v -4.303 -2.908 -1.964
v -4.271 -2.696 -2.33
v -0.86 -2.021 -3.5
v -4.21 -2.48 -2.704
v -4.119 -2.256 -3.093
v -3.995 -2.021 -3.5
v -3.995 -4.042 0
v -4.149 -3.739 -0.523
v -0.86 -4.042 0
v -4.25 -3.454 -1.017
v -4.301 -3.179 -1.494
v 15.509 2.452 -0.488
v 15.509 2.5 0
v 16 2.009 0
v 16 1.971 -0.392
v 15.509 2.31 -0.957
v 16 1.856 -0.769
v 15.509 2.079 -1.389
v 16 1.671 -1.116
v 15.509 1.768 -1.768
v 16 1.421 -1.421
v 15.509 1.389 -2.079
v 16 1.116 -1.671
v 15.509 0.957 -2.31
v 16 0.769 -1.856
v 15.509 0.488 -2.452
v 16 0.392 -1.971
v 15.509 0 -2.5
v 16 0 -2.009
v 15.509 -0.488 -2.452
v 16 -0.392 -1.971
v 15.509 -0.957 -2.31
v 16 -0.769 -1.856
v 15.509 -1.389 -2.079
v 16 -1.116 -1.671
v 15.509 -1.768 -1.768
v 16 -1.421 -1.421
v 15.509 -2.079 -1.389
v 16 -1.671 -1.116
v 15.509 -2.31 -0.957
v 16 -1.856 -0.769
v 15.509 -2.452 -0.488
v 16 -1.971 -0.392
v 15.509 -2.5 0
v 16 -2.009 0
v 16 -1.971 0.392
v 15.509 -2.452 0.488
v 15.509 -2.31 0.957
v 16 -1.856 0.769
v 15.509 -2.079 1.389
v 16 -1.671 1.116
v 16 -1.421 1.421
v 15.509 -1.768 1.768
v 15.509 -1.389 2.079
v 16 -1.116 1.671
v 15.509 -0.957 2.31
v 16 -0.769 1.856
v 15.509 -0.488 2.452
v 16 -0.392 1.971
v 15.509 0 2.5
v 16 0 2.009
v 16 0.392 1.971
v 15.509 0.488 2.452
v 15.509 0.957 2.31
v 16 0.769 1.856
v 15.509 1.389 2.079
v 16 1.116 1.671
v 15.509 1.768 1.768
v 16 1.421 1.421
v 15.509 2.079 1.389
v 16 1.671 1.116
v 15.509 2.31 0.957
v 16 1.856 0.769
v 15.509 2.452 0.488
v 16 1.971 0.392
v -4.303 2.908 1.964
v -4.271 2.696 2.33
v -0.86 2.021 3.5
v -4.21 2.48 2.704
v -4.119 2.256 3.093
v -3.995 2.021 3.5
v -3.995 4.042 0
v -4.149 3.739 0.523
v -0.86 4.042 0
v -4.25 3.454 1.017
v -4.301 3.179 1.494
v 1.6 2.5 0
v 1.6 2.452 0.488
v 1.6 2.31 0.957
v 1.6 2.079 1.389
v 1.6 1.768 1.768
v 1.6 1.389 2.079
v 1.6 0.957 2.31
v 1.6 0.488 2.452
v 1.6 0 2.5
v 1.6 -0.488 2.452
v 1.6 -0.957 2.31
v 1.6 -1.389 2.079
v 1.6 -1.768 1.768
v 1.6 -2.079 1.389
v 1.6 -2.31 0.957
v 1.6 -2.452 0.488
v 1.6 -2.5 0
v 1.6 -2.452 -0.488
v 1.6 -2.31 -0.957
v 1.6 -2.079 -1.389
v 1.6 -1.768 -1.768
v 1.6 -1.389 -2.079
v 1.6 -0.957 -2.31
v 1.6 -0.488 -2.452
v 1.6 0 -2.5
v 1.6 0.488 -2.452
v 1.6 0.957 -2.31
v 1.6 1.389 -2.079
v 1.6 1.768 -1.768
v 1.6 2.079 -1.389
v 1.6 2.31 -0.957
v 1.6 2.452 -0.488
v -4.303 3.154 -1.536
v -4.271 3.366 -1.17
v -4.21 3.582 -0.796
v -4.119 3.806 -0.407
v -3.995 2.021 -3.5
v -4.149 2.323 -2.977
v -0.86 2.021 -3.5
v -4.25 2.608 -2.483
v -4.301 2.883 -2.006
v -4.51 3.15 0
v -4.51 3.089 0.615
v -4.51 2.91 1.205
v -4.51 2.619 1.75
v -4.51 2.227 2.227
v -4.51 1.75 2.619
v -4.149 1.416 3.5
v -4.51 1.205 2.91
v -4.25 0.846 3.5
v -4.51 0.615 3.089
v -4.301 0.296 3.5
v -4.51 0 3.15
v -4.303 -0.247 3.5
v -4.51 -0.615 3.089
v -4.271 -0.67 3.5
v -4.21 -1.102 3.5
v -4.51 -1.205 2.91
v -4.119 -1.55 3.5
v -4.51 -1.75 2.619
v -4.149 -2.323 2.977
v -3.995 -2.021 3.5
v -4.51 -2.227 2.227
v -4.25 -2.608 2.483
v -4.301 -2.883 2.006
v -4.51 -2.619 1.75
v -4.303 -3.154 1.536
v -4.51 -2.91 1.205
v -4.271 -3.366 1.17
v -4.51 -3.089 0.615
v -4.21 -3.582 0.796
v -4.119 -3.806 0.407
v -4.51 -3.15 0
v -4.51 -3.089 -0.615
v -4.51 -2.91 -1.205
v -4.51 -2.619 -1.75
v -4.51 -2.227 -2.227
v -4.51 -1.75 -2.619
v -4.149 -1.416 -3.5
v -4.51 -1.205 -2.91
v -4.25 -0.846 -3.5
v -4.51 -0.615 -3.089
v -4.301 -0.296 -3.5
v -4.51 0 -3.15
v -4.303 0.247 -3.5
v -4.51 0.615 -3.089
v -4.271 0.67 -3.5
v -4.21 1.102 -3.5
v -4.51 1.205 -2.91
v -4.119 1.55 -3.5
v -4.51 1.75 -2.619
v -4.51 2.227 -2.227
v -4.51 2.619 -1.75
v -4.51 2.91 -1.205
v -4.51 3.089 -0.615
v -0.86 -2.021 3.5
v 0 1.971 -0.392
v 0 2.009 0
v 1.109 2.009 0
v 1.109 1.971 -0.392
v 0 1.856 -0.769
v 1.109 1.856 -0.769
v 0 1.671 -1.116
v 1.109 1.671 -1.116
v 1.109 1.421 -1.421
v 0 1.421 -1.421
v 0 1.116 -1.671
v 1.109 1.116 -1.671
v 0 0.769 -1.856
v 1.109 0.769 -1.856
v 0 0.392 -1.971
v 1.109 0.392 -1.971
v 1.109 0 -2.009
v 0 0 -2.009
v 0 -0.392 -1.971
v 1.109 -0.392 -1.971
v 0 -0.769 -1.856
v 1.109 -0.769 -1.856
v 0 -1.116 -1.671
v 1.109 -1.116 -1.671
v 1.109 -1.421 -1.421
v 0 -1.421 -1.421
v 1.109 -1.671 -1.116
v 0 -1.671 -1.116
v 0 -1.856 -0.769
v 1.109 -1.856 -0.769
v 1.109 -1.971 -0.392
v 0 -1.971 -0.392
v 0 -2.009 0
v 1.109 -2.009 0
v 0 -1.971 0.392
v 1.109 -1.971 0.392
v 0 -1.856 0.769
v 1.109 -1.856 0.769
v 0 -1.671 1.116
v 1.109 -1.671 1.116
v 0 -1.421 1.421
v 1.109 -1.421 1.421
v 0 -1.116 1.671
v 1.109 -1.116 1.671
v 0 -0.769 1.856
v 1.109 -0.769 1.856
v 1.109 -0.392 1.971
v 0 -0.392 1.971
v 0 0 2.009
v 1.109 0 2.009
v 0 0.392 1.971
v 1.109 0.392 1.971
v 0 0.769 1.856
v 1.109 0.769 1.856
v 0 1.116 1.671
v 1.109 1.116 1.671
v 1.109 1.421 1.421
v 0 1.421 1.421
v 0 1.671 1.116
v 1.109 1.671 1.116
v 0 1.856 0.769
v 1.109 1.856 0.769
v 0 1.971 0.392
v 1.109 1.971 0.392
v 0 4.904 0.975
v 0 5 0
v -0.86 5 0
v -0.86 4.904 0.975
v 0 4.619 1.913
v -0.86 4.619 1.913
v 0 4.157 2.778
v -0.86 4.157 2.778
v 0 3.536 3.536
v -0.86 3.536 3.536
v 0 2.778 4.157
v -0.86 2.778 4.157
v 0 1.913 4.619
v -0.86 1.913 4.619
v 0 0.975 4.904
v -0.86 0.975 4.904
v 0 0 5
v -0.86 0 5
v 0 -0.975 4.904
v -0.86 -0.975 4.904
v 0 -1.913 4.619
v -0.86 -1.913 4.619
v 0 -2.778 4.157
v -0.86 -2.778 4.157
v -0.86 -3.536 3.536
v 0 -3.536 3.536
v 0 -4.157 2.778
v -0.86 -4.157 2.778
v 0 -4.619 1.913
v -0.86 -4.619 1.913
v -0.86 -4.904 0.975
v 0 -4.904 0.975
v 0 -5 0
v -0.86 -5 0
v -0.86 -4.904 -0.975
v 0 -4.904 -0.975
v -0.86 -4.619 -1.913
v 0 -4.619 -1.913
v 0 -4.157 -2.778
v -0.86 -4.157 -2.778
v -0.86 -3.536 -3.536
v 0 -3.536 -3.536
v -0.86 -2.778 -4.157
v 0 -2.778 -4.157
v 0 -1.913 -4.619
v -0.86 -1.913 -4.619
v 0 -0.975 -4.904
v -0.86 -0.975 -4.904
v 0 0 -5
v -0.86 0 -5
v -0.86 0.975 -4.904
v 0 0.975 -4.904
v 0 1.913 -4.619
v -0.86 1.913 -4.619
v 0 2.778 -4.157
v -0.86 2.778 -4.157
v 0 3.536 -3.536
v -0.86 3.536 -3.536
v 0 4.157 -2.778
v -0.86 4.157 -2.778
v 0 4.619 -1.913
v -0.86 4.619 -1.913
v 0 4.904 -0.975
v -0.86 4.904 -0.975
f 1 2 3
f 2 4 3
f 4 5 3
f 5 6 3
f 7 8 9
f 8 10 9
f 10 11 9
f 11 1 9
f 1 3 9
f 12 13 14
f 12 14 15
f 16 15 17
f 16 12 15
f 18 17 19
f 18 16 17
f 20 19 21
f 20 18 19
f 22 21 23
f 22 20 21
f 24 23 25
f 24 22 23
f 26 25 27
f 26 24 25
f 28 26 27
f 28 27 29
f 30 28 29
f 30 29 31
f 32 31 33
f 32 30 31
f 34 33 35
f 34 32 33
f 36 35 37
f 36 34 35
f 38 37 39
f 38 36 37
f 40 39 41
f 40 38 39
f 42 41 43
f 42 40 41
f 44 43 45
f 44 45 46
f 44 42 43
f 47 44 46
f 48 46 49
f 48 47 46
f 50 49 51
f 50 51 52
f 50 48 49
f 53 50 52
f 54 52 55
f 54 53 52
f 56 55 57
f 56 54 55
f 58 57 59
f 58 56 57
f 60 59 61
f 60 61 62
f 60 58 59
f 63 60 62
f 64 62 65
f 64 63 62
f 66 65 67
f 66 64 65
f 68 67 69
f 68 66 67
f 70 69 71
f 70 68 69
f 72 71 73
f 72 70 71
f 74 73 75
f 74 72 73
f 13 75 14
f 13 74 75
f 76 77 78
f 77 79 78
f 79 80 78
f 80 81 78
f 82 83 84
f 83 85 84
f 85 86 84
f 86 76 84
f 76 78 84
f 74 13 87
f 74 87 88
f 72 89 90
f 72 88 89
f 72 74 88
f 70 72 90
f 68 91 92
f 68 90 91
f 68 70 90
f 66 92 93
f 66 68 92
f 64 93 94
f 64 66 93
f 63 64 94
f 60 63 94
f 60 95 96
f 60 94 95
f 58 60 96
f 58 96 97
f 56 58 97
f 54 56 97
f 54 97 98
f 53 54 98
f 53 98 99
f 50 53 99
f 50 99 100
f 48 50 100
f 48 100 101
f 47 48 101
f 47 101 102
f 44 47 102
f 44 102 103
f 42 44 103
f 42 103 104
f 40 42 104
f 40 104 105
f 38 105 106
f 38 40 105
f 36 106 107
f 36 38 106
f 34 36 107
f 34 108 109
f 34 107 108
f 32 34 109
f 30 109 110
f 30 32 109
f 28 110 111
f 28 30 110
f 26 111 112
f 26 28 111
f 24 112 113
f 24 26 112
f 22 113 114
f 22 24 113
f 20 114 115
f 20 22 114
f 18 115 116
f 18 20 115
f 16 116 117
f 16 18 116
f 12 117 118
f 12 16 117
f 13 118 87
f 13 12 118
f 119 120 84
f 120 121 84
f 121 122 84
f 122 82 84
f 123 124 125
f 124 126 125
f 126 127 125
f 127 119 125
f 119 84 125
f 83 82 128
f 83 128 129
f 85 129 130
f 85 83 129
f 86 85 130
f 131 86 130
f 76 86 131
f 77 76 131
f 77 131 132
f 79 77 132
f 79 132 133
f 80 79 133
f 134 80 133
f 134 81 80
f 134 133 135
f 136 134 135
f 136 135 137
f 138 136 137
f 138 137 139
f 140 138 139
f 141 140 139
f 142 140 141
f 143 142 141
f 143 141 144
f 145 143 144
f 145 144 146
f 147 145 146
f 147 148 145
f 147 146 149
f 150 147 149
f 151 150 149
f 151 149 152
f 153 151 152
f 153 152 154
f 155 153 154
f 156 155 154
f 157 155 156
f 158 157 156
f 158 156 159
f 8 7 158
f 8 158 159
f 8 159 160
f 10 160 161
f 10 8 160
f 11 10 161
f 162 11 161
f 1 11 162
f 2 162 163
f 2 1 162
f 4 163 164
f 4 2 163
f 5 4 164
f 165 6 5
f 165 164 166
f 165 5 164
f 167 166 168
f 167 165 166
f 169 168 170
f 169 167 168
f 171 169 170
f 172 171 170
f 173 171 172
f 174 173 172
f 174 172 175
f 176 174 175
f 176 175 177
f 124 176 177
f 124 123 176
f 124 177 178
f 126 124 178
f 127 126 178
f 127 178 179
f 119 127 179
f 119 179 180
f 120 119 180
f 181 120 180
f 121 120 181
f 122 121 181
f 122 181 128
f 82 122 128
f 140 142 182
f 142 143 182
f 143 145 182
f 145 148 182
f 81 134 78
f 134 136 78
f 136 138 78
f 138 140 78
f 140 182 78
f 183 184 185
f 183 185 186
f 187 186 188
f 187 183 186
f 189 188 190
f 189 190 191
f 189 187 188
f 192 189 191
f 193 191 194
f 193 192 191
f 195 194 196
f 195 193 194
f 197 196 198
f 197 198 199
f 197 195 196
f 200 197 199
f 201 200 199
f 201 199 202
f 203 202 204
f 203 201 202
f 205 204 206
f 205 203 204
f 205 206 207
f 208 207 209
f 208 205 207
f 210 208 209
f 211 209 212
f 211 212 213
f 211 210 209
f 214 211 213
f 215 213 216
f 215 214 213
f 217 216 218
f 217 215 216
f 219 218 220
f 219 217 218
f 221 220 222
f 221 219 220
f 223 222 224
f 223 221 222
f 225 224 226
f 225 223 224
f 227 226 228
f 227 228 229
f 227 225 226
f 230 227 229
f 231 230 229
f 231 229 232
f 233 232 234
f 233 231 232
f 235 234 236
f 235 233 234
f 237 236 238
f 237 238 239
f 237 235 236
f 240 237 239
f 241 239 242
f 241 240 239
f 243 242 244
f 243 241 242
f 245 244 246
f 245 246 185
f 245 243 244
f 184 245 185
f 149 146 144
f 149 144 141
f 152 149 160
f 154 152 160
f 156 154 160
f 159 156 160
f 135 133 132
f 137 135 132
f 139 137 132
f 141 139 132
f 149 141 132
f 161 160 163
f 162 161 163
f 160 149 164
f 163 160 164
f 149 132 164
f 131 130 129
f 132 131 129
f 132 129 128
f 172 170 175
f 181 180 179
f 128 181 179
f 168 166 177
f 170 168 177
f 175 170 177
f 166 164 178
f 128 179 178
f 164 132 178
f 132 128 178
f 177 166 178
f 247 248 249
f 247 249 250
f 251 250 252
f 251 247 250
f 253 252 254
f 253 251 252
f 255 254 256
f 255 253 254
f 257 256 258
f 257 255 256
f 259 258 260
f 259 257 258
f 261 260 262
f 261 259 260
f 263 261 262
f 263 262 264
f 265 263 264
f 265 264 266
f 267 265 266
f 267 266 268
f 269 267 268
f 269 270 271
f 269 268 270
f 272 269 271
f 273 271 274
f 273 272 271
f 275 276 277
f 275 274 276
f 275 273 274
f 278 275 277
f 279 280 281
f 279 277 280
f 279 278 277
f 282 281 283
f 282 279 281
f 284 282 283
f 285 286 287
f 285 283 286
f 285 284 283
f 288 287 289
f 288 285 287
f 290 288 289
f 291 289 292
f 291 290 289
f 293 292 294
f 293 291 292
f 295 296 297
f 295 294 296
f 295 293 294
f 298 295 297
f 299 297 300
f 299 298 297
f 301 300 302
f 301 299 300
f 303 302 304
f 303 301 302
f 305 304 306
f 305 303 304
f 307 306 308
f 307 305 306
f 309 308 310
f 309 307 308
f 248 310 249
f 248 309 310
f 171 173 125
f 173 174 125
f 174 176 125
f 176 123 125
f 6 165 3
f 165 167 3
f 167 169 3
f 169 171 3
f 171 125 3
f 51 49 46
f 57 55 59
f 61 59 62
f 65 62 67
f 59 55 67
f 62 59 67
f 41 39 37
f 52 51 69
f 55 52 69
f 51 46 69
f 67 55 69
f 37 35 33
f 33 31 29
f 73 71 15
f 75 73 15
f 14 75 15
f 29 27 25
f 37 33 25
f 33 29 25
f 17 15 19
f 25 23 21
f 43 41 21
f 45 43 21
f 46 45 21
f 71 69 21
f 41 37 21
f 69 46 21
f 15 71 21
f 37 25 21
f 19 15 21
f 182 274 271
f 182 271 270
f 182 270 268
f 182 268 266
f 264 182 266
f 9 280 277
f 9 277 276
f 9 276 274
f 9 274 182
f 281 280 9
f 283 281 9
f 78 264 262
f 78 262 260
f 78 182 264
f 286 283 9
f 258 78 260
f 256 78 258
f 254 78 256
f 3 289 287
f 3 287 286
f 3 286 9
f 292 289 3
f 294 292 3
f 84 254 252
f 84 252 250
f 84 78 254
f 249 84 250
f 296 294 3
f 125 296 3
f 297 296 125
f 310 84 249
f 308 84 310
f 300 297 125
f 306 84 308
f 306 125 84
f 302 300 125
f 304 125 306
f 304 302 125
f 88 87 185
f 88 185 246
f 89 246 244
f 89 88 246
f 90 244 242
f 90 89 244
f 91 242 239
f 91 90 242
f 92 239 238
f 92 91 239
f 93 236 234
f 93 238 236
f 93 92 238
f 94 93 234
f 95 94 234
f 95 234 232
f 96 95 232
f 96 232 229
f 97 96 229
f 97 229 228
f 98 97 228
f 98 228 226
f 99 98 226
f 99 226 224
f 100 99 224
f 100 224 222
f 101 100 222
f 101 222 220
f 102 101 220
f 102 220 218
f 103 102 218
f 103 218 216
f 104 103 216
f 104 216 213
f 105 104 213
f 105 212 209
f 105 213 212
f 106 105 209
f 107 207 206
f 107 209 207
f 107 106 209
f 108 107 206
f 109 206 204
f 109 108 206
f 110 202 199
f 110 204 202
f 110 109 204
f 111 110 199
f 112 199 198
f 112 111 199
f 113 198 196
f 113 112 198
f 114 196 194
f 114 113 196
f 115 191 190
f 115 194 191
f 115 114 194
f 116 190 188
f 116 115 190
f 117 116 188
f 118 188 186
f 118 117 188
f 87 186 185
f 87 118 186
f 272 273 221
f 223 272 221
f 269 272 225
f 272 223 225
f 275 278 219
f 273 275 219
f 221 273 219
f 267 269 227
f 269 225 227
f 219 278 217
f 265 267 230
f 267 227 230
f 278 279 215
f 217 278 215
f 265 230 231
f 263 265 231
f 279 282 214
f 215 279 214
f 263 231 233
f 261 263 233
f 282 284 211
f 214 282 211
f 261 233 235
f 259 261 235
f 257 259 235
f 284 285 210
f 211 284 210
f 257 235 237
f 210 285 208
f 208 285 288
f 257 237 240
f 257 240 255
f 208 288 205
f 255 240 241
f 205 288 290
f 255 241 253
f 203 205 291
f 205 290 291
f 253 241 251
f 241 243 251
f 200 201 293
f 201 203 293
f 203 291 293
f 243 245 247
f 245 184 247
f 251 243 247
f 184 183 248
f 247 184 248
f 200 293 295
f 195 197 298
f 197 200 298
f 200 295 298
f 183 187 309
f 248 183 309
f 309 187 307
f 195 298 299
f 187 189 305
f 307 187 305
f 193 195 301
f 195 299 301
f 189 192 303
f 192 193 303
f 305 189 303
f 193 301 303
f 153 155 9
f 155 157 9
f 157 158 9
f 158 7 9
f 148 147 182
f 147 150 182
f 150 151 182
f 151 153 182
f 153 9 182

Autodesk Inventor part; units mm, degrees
ref_plane "YZ Plane" through (0, 0, 0) normal (1, 0, 0) x (0, 1, 0)
ref_plane "XZ Plane" through (0, 0, 0) normal (0, 1, 0) x (-1, 0, 0)
sketch "Sketch1" plane through (0, 0, 0) normal (0, 0, 1) x (1, 0, 0)
  line L0 (0, 5) -> (0, 2.0092)
  line L1 (1.6, 2.5) -> (16, 2.5)
  line L2 (16, 2.5) -> (16, 0)
  line L3 (16, 0) -> (-0.86, 0)
  line L4 (0, -1) -> (0, 6) projected
  line L5 (-4.232, 0) -> (19.372, 0) projected
  line L6 (-0.86, 0) -> (-0.86, 5)
  line L7 (-0.86, 5) -> (0, 5)
  line L8 (1.6, 2.5) -> (1.1092, 2.0092)
  line L9 (1.1092, 2.0092) -> (0, 2.0092)
  dimension "d0" = 16
  dimension "d1" = 14.4
  dimension "d2" = 5
  dimension "d8" = 0.86
  dimension "d9" = 10
  dimension "d15" = 4.0185
  dimension "d16" = 0.4908
revolve "Body" add sketch "Sketch1" angle 360 about axis through (16, 0, 0) along (-1, 0, 0)
sketch "Sketch2" plane through (0, 0, 0) normal (1, 0, 0) x (0, 0, -1)
  circle A0 centre (0, 0) radius 5 projected
  line L0 (0, 4.0415) -> (3.5, 2.0207)
  line L1 (3.5, 2.0207) -> (3.5, -2.0207)
  line L2 (3.5, -2.0207) -> (0, -4.0415)
  line L3 (0, -4.0415) -> (-3.5, -2.0207)
  line L4 (-3.5, -2.0207) -> (-3.5, 2.0207)
  line L5 (-3.5, 2.0207) -> (0, 4.0415)
  circle A1 centre (0, 0) radius 5 projected
  dimension "d10" = 7
extrude "Head" add sketch "Sketch2" against normal blind 4.51 contours L0 L1 L2 L3 L4 L5
sketch "Sketch3" plane through (0, 0, 0) normal (0, 0, 1) x (1, 0, 0)
  line L0 (-4.51, 3.15) -> (-4.51, 4.0415)
  line L1 (-4.51, 4.0415) -> (-3.9953, 4.0415)
  line L2 (-3.9953, 4.0415) -> (-4.51, 3.15)
  line L3 (-2.0945, 4.0415) -> (-4.51, 4.0415)
  line L4 (-4.51, 4.0415) -> (-4.51, 1.7321)
  line L5 (-0.86, 4.0415) -> (-4.51, 4.0415) projected
  line L6 (-4.51, 4.0415) -> (-4.51, 2.0207) projected
  line L7 (-5.24, 0) -> (-0.13, 0) projected
  dimension "d5" = 30
  dimension "d18" = 6.3
revolve "Chamfer1" cut sketch "Sketch3" angle 360 about axis through (-10, 0, 0) along (1, 0, 0)
thread "Thread" size "M5x0.8" class "6g" standard "ISO Metric profile" length 14.4
chamfer "Chamfer2" distance 0.4908 distance2 0.4908 1 edges at (16, -2.5, 0) measured on face at (16, 0.6587, 0.3326)
ref_plane "Work Plane1" through (3.5, 0, 0) normal (0, 0, 1) x (1, 0, 0)
equation "\"d10\" = SW"
equation "\"d3\" = KOH"
equation "\"d13\" = GEL"
equation "\"d6\" = -0.5 * SPD + 0.5 * GD"
equation "\"d7\" = -0.5 * SPD + 0.5 * GD"
equation "\"d0\" = NLG"
equation "\"d1\" = GEL"
equation "\"d2\" = GD"
equation "\"d8\" = PHH"
equation "\"d9\" = LADI"
equation "\"d15\" = BDM"
equation "\"d16\" = GAL"
equation "\"d5\" = ANG1"
equation "\"d18\" = SW0"
equation "\"NLG\" = 16"
equation "\"GD\" = NND"
equation "\"BDM\" = NND - 1.2269 * PTC"
equation "\"KOH\" = 4.51"
equation "\"GEL\" = 14.4"
equation "\"LADI\" = 10"
equation "\"SW\" = 7"
equation "\"PHH\" = 0.86"
equation "\"SW0\" = 6.3"
equation "\"SPD\" = NND - 1.2269 * PTC"
equation "\"ANG1\" = 30deg"
equation "\"GAL\" = 0.61345 * PTC"
equation "\"GUL\" = 0.61345 * PTC"
equation "\"WFT\" = PHH"
equation "\"PTC\" = 0.8"
equation "\"THREADDIA\" = 5"
equation "\"E0\" = 1.155 * SW"
equation "\"TOA\" = 30deg"
equation "\"NND\" = 5"
equation "\"GD1\" = THREADDIA - 1.2269 * PTC"
equation "\"SDH\" = 5.7"
equation "\"KOH1\" = 3.65"
equation "\"SD2\" = NND"
equation "\"SD\" = 0"
equation "\"RR\" = 0.2"
properties part number "AS 1427 - M5 x 16" material "Steel, Mild"
